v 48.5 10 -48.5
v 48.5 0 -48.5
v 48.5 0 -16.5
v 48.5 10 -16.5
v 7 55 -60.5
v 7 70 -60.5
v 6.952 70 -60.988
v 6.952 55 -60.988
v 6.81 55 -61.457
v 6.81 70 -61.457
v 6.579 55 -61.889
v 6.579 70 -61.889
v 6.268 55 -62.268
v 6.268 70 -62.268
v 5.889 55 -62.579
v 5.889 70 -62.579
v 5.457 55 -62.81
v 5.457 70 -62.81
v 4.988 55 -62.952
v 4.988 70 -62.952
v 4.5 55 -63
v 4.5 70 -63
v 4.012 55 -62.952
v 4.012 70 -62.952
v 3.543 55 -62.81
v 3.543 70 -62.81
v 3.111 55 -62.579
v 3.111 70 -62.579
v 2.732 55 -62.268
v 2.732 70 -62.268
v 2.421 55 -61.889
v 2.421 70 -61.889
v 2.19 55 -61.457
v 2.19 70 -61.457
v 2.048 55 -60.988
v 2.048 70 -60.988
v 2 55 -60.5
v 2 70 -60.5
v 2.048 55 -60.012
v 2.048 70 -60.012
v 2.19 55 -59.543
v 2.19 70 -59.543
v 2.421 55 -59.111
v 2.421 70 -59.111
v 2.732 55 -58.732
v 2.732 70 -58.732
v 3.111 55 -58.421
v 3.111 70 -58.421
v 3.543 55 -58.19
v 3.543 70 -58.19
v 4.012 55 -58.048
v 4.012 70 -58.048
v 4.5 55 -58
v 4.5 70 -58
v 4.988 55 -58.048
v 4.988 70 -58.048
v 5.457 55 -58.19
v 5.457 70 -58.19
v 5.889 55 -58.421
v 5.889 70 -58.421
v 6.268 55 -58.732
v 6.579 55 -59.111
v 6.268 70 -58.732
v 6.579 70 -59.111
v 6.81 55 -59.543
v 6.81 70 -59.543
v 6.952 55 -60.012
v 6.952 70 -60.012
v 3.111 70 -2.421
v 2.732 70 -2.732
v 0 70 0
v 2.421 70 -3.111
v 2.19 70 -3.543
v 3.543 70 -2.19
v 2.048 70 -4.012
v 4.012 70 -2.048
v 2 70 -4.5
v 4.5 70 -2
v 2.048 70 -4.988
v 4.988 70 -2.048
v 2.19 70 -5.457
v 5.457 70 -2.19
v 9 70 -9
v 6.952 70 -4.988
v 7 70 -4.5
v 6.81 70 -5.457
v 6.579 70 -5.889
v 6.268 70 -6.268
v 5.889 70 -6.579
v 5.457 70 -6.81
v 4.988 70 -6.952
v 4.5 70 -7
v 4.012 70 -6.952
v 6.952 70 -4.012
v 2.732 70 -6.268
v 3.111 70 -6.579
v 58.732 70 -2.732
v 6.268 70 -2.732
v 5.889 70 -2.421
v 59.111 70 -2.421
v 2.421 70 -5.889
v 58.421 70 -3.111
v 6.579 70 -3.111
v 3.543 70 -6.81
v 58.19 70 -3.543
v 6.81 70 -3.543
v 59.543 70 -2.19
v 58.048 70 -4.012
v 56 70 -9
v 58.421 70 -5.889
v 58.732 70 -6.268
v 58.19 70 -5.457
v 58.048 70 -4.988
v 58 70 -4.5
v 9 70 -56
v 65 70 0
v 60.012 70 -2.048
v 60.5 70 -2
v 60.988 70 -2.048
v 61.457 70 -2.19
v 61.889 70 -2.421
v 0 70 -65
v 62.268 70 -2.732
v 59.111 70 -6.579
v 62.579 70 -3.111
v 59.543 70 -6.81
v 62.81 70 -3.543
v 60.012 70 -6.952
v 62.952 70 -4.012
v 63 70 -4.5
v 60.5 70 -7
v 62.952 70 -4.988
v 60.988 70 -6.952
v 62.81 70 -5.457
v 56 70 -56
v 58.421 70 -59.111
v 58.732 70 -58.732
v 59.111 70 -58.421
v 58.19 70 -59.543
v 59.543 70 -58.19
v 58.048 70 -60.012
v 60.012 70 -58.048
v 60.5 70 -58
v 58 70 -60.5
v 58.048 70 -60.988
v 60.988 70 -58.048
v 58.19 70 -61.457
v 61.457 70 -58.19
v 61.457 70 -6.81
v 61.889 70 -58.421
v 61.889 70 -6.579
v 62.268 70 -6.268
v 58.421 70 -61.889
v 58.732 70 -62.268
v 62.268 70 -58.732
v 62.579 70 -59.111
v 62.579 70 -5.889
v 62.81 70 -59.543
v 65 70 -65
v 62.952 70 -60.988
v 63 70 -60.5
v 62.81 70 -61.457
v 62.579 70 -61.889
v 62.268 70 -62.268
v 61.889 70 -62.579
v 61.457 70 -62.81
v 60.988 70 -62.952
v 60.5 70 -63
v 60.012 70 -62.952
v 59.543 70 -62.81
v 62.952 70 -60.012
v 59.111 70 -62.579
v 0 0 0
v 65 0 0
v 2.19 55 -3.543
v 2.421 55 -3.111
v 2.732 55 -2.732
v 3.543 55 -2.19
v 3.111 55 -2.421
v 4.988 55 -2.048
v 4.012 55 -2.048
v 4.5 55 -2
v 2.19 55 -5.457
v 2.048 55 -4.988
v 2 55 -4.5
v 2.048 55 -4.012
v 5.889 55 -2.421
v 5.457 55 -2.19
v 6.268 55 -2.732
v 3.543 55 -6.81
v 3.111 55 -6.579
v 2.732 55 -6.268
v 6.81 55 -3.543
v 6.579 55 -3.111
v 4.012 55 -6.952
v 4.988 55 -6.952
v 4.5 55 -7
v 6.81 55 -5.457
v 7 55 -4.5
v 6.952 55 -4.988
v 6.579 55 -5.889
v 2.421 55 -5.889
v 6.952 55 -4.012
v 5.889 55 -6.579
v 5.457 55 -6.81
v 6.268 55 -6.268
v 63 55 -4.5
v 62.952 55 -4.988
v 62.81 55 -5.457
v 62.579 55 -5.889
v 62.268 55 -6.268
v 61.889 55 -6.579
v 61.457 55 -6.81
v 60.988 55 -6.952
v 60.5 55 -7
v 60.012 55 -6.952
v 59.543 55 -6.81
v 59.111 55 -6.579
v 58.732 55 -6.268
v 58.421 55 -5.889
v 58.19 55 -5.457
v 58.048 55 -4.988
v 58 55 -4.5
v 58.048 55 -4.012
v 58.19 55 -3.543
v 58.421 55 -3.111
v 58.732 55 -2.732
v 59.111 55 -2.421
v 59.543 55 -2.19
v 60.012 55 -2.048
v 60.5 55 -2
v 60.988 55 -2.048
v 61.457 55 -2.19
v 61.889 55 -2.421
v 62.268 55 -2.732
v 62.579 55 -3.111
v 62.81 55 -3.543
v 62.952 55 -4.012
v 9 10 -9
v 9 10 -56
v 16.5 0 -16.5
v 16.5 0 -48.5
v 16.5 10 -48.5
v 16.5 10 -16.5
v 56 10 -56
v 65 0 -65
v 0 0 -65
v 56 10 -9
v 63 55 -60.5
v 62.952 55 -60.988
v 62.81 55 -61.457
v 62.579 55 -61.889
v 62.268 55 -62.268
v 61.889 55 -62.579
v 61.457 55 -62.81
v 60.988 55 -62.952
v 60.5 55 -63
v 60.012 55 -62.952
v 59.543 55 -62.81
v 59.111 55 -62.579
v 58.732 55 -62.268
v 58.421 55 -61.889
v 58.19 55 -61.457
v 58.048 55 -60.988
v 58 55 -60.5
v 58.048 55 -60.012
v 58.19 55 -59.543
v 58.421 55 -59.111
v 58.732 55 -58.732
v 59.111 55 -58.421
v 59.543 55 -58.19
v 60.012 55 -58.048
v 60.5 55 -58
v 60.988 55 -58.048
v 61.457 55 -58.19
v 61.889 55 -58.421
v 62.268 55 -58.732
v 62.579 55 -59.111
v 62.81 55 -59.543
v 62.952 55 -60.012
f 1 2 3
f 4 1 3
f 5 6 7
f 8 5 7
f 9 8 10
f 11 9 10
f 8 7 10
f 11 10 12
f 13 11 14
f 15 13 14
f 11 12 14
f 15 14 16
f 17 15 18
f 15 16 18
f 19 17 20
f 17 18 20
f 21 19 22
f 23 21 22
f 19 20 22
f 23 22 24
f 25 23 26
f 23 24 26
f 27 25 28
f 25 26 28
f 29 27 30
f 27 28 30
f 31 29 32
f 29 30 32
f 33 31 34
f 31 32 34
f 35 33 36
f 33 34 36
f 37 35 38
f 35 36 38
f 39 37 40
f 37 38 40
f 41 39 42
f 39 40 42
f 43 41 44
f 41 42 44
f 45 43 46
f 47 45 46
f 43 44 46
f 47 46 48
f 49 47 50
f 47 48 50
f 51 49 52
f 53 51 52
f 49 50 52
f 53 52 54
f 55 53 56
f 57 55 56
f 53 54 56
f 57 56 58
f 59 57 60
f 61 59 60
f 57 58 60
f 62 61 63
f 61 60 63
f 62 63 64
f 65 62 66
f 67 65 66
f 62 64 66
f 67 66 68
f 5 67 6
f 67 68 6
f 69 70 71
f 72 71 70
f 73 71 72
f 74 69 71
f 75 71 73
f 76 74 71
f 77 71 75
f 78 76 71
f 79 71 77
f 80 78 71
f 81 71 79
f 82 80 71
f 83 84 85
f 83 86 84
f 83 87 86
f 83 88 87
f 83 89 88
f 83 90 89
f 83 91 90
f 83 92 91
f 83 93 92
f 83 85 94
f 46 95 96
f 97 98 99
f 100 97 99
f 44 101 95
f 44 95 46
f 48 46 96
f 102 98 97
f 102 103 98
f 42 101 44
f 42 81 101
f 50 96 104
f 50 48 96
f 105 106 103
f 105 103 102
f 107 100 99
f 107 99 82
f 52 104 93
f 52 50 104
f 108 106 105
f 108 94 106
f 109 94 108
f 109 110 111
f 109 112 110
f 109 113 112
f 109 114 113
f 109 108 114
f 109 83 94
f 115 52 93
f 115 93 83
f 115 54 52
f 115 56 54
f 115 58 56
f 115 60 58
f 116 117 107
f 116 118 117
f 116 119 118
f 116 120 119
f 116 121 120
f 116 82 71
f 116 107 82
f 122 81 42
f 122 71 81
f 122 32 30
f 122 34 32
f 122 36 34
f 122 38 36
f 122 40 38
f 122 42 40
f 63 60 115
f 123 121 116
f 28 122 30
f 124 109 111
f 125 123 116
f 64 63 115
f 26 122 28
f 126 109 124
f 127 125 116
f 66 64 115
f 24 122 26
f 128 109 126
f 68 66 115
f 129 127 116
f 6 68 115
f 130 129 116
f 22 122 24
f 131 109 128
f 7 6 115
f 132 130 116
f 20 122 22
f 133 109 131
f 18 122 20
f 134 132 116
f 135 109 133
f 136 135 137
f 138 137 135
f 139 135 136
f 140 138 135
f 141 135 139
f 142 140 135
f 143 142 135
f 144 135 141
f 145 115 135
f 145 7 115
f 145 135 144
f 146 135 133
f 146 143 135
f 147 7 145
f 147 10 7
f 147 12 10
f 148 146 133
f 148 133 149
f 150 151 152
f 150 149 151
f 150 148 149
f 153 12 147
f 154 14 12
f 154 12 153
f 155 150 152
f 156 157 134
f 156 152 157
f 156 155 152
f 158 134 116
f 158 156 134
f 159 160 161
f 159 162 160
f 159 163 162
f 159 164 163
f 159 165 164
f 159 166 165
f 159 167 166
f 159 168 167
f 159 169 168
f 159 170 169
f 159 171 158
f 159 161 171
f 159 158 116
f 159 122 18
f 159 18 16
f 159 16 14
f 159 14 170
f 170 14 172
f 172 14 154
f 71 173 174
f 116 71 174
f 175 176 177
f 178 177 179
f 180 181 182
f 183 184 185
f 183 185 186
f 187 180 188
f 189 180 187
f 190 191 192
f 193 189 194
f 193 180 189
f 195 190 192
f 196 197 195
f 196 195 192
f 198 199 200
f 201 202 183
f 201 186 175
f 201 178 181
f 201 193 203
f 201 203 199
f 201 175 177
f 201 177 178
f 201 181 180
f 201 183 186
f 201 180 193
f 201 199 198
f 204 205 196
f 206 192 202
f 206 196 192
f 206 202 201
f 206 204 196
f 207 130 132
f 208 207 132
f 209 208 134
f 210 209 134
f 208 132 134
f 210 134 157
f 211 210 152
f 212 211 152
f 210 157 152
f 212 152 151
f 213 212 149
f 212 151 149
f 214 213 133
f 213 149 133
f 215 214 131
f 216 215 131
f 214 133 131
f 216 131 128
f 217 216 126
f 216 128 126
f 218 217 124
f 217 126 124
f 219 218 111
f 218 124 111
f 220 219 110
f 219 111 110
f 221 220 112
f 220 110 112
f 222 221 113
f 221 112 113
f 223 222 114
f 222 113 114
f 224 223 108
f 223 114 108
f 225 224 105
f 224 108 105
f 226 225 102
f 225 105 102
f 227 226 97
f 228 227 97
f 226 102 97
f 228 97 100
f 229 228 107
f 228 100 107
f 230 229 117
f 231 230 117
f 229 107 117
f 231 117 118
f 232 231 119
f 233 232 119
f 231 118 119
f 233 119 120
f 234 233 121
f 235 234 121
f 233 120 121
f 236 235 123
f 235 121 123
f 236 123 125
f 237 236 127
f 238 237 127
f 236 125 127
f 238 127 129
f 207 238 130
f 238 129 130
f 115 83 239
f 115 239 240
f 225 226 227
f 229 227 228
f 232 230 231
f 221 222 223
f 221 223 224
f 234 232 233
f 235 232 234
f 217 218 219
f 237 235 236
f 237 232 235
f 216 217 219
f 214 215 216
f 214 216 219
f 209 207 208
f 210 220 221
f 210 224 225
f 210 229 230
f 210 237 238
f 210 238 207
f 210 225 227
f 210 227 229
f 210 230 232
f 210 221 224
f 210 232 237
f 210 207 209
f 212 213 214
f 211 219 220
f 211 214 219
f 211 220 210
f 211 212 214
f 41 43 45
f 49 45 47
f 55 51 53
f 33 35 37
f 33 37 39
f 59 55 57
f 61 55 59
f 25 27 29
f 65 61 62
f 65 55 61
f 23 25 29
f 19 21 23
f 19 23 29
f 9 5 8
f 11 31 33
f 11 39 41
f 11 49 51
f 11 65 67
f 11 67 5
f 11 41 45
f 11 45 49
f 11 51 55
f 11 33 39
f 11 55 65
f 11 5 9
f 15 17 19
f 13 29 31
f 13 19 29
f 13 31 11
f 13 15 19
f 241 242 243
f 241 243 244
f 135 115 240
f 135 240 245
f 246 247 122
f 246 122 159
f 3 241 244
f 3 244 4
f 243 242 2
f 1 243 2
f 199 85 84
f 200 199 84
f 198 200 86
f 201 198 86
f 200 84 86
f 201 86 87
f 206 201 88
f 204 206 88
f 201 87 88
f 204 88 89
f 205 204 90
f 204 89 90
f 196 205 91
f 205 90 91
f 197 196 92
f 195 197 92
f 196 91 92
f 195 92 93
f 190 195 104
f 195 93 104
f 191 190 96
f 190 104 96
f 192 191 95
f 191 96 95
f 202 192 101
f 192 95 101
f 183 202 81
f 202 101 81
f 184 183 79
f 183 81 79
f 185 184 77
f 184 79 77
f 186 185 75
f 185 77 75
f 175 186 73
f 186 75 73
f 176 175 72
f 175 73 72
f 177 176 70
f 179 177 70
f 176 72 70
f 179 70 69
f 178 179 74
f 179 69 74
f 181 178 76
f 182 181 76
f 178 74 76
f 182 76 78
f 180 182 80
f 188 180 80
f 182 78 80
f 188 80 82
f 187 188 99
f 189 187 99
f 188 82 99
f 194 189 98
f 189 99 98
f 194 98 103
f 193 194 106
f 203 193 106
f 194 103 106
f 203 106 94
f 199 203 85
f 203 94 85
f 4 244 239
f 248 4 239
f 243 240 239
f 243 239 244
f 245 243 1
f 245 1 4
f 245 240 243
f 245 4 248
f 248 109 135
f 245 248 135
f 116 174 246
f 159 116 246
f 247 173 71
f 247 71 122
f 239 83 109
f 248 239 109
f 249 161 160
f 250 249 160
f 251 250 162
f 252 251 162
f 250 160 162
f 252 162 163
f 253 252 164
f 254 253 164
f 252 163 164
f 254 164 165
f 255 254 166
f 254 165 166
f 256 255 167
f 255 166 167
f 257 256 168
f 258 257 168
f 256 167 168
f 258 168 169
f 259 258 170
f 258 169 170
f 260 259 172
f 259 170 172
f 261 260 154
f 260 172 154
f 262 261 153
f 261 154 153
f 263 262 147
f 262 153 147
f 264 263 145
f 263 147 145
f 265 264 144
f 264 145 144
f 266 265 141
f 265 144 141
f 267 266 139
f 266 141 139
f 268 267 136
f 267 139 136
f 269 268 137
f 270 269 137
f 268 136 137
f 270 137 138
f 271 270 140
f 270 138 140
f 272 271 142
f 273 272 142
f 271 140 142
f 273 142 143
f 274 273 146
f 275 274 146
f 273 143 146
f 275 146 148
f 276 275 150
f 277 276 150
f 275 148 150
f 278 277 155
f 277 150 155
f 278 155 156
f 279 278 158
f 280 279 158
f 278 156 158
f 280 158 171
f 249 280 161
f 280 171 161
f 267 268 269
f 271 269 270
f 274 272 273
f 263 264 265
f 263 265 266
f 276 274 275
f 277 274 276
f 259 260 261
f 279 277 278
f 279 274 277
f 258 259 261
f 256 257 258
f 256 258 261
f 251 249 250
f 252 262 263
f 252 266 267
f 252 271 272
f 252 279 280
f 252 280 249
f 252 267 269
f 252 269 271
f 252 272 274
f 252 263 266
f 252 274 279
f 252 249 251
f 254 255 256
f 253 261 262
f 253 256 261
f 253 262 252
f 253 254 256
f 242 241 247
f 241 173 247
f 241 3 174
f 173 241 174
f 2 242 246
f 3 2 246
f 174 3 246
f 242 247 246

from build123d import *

# Parameters (mm, degrees)
SKETCH1_W           = 65
SKETCH1_H           = 65
BOSS_EXTRUDE1_DEPTH = 70
SKETCH2_W           = 47
SKETCH2_H           = 47
CUT_EXTRUDE1_DEPTH  = 60
SKETCH3_W           = 32
SKETCH3_H           = 32
CUT_EXTRUDE2_DEPTH  = 60
SKETCH4_R           = 2.5
CUT_EXTRUDE3_DEPTH  = 15


with BuildPart() as part:
    # Sketch1 → Boss-Extrude1 (new body)
    with BuildSketch(Plane(origin=(0, 0, 0), x_dir=(1, 0, 0), z_dir=(0, 1, 0))):
        with Locations((32.5, 32.5)):
            Rectangle(SKETCH1_W, SKETCH1_H)
    extrude(amount=BOSS_EXTRUDE1_DEPTH)

    # Sketch2 → Cut-Extrude1 (cut)
    with BuildSketch(Plane(origin=(0, 70, 0), x_dir=(1, 0, 0), z_dir=(0, 1, 0))):
        with Locations((32.5, 32.5)):
            Rectangle(SKETCH2_W, SKETCH2_H)
    extrude(amount=-CUT_EXTRUDE1_DEPTH, mode=Mode.SUBTRACT)

    # Sketch3 → Cut-Extrude2 (cut)
    with BuildSketch(Plane.XZ):
        with Locations((32.5, -32.5)):
            Rectangle(SKETCH3_W, SKETCH3_H)
    extrude(amount=-CUT_EXTRUDE2_DEPTH, mode=Mode.SUBTRACT)

    # Sketch4 → Cut-Extrude3 (cut)
    with BuildSketch(Plane(origin=(0, 70, 0), x_dir=(1, 0, 0), z_dir=(0, 1, 0))):
        with Locations((4.5, 60.5)):
            Circle(SKETCH4_R)
        with Locations((60.5, 60.5)):
            Circle(SKETCH4_R)
        with Locations((60.5, 4.5)):
            Circle(SKETCH4_R)
        with Locations((4.5, 4.5)):
            Circle(SKETCH4_R)
    extrude(amount=-CUT_EXTRUDE3_DEPTH, mode=Mode.SUBTRACT)


solid = part.part
